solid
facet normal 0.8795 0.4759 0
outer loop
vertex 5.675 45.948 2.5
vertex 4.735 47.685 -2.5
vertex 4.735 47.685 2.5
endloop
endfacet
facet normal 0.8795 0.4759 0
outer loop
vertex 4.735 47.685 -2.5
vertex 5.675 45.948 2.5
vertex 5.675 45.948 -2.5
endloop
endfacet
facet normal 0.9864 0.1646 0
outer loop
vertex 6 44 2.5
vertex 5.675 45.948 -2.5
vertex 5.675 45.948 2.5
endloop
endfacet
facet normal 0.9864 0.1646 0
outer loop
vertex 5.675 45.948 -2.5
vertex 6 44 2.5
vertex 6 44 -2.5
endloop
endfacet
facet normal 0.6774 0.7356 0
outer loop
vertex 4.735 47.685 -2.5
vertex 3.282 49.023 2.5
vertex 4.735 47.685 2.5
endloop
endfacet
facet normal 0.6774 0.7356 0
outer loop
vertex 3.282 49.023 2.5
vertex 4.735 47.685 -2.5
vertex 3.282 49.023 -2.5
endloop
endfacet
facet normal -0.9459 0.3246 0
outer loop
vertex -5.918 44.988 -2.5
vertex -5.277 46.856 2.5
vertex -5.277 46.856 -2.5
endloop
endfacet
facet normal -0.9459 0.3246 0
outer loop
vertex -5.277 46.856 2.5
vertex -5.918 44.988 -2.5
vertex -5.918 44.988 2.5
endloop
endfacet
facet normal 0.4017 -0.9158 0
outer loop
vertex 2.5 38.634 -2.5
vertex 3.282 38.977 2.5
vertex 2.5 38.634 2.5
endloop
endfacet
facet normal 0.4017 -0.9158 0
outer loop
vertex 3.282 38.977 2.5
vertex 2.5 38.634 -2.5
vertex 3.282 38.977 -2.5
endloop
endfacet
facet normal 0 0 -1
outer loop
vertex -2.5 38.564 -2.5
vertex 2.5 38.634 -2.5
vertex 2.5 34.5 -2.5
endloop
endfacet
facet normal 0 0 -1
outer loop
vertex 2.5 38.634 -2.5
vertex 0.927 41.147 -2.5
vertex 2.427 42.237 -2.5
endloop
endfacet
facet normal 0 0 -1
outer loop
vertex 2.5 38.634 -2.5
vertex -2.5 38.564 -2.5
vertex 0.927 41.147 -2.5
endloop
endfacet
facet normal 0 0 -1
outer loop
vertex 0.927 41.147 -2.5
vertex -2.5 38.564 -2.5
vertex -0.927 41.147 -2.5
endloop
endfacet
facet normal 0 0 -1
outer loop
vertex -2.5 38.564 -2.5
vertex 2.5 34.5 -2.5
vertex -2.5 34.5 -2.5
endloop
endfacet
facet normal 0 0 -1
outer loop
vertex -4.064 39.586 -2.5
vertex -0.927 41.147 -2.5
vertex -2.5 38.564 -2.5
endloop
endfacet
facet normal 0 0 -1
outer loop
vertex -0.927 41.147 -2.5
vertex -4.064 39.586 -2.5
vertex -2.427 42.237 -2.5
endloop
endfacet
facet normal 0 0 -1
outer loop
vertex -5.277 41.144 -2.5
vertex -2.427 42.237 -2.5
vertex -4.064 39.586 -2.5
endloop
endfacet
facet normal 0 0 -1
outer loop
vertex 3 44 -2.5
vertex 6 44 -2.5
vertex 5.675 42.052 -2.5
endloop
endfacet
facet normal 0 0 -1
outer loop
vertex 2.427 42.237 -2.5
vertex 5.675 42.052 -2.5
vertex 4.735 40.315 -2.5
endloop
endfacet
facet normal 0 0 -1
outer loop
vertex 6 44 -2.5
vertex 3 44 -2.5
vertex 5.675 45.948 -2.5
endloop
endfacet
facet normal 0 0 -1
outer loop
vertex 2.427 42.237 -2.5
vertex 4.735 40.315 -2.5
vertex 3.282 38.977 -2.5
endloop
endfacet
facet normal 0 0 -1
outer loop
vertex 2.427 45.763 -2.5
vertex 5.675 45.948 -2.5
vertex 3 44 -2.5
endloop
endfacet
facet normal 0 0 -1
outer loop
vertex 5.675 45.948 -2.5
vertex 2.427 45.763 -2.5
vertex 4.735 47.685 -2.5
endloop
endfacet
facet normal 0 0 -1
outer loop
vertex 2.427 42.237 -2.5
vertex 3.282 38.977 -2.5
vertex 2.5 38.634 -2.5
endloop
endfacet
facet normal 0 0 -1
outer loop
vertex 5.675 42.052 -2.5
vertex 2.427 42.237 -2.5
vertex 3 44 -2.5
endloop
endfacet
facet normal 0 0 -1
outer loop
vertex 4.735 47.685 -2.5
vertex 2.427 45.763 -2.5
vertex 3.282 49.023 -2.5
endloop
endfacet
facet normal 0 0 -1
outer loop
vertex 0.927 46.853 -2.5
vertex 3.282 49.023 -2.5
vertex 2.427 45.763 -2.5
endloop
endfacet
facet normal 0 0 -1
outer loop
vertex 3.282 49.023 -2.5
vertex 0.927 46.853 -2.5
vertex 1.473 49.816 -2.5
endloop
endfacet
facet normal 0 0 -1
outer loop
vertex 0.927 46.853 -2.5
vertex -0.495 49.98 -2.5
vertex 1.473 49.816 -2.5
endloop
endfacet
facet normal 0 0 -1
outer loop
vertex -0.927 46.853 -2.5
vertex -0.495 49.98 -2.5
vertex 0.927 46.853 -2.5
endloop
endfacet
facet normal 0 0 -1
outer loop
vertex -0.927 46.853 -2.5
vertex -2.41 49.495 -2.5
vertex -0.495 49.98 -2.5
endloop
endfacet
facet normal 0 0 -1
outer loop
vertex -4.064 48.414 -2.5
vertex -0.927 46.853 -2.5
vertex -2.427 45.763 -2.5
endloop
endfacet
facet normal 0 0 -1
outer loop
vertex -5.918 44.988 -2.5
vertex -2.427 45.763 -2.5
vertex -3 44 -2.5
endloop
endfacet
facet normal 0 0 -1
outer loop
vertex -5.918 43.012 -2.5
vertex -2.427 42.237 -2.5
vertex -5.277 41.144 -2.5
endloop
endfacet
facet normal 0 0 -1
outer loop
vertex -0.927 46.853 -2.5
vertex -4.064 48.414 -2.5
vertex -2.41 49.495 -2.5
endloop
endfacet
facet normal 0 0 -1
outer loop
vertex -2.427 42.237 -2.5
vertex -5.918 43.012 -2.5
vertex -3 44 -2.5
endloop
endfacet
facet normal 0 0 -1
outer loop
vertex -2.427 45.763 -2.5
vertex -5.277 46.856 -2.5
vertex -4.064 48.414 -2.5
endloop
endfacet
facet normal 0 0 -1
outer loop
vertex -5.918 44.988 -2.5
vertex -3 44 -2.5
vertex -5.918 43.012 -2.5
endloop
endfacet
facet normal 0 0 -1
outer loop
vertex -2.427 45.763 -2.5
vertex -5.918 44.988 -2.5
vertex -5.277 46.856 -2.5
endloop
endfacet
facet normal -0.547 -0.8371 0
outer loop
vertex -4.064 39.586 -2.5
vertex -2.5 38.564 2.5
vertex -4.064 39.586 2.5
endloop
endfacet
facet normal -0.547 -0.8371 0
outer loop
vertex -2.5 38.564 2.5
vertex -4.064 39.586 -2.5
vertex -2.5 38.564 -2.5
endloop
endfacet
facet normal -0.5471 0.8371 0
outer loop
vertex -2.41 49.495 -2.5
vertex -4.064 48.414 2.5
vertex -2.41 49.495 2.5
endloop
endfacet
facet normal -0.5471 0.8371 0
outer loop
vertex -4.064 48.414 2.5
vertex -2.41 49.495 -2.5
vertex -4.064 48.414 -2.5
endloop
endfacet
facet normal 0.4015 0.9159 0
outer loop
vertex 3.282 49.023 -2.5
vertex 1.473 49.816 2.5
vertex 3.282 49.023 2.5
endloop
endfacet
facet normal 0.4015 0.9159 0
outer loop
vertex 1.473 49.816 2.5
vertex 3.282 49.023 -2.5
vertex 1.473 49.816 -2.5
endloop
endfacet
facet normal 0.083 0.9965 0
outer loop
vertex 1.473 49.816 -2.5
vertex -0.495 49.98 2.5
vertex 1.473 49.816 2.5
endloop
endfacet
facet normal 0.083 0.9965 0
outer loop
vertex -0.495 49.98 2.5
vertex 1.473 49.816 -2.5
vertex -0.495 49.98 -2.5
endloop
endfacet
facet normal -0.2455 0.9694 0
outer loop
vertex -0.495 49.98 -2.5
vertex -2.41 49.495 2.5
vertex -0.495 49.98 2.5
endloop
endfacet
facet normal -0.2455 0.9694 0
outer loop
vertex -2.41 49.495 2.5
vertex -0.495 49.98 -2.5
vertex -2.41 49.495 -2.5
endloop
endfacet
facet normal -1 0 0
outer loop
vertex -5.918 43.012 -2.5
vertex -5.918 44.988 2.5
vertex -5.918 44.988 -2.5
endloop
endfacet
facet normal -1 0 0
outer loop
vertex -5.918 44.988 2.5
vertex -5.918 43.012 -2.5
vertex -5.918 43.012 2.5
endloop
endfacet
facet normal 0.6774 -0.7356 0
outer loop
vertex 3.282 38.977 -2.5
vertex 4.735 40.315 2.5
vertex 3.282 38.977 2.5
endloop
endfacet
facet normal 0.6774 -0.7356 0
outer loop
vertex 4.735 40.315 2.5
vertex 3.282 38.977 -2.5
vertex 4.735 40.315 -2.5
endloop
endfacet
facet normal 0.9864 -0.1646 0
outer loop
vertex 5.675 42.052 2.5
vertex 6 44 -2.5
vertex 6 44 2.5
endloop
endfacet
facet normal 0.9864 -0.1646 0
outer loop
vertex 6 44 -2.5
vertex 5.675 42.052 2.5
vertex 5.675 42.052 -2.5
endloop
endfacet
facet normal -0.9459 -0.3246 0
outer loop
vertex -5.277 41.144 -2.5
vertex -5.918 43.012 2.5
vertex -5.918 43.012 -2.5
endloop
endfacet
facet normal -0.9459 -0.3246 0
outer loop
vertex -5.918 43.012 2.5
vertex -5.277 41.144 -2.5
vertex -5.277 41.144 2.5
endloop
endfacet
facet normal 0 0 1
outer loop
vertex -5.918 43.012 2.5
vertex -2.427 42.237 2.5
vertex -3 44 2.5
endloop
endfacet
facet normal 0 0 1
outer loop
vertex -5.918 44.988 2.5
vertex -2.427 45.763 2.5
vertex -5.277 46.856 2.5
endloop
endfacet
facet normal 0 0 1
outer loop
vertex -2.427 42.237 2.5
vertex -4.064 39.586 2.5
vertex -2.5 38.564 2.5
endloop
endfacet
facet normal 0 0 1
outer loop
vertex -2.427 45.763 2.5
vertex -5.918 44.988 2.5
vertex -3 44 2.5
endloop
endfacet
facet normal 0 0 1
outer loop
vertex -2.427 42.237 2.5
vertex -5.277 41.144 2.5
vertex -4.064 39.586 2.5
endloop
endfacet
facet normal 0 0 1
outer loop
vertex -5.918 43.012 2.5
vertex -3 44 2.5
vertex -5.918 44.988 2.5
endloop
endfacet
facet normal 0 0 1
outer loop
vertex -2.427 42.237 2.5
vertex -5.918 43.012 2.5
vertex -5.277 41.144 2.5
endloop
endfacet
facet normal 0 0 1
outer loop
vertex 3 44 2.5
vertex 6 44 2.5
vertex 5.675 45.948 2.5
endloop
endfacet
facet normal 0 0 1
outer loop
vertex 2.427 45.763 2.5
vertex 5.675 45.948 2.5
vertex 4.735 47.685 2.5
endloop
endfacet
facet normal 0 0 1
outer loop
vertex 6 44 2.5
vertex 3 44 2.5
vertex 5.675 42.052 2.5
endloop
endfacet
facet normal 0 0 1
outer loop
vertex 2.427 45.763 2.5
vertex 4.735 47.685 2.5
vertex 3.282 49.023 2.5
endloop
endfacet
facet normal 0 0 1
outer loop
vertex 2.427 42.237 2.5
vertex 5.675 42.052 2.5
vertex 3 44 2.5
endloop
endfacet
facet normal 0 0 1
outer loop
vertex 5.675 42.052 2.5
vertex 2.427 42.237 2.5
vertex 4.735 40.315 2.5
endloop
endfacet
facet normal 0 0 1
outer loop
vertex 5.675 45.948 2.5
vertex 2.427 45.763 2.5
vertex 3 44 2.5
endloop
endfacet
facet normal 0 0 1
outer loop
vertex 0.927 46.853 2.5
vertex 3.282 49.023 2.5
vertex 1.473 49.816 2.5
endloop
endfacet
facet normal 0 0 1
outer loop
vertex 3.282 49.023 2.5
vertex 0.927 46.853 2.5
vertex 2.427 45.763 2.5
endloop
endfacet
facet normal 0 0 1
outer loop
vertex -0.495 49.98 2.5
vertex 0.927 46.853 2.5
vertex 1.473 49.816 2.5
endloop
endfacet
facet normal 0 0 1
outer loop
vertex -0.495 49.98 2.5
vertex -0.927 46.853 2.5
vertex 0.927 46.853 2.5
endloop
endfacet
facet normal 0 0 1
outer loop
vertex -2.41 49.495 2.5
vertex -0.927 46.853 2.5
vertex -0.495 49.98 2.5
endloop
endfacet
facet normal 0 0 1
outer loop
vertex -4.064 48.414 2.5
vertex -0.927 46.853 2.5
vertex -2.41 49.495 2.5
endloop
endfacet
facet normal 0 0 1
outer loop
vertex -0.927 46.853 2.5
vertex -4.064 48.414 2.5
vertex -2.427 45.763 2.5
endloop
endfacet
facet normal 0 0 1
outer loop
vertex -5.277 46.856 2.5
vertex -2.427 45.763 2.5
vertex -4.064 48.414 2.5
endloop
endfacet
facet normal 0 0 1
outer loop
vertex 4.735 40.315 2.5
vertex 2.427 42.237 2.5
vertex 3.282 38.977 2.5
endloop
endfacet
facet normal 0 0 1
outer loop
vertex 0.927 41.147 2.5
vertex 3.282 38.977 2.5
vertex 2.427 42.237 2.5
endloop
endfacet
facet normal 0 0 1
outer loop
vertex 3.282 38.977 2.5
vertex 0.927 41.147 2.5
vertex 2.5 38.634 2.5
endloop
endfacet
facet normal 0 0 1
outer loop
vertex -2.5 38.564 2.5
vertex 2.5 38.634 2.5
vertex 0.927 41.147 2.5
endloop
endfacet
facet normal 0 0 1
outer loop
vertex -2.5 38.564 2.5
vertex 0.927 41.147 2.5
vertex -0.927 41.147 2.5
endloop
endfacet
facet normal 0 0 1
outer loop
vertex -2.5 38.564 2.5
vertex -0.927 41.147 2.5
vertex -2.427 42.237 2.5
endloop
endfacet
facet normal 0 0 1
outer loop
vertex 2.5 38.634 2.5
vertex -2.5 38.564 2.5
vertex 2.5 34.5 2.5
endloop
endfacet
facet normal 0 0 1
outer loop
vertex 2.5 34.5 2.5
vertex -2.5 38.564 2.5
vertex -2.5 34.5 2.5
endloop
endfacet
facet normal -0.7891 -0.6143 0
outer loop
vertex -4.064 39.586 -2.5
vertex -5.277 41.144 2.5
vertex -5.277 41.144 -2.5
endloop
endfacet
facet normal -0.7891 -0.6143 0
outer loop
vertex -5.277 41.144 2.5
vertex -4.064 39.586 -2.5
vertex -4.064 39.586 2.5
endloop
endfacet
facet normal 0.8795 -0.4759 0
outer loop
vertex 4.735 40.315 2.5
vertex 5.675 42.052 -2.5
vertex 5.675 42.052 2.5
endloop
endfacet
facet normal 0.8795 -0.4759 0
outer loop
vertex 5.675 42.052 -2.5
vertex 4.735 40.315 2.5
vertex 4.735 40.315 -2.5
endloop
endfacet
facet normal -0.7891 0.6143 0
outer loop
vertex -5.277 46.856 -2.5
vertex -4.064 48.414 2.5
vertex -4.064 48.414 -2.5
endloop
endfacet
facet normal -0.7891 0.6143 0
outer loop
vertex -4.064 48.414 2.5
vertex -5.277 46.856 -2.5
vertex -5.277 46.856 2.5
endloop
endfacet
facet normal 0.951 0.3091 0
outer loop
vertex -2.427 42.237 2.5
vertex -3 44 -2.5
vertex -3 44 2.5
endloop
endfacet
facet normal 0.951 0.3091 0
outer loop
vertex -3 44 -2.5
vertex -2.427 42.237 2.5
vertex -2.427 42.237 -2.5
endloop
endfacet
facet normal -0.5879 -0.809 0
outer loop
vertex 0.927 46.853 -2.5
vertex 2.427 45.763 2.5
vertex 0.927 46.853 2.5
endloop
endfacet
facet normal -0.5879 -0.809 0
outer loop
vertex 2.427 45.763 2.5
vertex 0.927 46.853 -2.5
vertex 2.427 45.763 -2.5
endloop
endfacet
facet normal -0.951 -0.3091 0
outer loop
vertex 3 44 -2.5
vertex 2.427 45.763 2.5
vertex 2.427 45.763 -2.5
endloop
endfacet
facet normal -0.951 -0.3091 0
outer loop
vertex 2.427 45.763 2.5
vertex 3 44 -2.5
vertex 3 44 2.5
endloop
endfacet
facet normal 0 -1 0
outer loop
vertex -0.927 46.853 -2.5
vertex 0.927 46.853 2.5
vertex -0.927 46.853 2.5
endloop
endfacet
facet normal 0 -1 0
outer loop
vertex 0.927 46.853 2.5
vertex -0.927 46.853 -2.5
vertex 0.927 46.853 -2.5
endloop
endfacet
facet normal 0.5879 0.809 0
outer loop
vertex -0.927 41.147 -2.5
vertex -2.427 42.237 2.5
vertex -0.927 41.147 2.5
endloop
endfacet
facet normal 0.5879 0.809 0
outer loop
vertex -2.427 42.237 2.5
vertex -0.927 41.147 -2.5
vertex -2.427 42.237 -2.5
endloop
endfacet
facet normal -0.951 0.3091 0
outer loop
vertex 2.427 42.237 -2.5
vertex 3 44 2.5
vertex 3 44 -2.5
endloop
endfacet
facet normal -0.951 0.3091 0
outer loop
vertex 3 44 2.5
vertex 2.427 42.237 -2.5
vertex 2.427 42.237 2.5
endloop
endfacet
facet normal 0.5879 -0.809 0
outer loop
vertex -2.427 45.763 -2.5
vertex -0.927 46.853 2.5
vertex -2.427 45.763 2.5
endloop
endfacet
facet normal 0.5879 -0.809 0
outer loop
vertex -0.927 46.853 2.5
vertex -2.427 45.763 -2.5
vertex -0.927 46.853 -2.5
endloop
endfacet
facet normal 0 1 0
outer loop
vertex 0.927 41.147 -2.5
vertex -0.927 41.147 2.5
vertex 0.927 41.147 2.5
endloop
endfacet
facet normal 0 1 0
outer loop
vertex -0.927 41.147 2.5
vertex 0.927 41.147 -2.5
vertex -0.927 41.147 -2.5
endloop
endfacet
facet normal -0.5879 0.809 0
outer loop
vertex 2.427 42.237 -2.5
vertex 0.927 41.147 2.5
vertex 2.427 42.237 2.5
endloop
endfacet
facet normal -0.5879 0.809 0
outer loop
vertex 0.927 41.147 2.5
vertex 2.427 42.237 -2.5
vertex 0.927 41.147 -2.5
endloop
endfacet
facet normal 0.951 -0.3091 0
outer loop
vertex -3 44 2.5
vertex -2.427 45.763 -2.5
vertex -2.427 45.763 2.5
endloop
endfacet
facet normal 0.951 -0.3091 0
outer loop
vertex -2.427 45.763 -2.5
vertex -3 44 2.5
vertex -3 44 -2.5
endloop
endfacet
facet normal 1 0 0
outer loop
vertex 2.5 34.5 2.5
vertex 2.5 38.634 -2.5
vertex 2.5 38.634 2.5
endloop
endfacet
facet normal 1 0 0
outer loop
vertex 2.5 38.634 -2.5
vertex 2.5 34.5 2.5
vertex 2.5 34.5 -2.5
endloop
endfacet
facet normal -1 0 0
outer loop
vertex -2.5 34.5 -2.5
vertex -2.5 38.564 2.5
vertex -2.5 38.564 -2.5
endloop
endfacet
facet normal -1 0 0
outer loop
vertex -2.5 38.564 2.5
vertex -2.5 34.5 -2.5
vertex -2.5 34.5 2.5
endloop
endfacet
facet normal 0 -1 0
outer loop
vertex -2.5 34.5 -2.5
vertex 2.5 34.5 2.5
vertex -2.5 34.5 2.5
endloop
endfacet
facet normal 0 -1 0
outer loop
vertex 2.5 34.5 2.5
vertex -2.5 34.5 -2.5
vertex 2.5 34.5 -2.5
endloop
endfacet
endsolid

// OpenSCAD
h = 5;



module loop() {
	translate([0,44,0]) {
		union(){
			difference() {
				cylinder(h,6,6, center = true);
				cylinder(h,3,3, center = true);
			}
			translate([0,-7,0])cube([5,5,5], center = true);
		}
	}
}


union() {
	translate([0,0,-2.5])scale([0.82,0.82,1])linear_extrude(height = h) import(filename="rebel.dxf");
	loop();
}

//translate([0,0,-5]) color([0,1,0]) cylinder(h,40,40);
